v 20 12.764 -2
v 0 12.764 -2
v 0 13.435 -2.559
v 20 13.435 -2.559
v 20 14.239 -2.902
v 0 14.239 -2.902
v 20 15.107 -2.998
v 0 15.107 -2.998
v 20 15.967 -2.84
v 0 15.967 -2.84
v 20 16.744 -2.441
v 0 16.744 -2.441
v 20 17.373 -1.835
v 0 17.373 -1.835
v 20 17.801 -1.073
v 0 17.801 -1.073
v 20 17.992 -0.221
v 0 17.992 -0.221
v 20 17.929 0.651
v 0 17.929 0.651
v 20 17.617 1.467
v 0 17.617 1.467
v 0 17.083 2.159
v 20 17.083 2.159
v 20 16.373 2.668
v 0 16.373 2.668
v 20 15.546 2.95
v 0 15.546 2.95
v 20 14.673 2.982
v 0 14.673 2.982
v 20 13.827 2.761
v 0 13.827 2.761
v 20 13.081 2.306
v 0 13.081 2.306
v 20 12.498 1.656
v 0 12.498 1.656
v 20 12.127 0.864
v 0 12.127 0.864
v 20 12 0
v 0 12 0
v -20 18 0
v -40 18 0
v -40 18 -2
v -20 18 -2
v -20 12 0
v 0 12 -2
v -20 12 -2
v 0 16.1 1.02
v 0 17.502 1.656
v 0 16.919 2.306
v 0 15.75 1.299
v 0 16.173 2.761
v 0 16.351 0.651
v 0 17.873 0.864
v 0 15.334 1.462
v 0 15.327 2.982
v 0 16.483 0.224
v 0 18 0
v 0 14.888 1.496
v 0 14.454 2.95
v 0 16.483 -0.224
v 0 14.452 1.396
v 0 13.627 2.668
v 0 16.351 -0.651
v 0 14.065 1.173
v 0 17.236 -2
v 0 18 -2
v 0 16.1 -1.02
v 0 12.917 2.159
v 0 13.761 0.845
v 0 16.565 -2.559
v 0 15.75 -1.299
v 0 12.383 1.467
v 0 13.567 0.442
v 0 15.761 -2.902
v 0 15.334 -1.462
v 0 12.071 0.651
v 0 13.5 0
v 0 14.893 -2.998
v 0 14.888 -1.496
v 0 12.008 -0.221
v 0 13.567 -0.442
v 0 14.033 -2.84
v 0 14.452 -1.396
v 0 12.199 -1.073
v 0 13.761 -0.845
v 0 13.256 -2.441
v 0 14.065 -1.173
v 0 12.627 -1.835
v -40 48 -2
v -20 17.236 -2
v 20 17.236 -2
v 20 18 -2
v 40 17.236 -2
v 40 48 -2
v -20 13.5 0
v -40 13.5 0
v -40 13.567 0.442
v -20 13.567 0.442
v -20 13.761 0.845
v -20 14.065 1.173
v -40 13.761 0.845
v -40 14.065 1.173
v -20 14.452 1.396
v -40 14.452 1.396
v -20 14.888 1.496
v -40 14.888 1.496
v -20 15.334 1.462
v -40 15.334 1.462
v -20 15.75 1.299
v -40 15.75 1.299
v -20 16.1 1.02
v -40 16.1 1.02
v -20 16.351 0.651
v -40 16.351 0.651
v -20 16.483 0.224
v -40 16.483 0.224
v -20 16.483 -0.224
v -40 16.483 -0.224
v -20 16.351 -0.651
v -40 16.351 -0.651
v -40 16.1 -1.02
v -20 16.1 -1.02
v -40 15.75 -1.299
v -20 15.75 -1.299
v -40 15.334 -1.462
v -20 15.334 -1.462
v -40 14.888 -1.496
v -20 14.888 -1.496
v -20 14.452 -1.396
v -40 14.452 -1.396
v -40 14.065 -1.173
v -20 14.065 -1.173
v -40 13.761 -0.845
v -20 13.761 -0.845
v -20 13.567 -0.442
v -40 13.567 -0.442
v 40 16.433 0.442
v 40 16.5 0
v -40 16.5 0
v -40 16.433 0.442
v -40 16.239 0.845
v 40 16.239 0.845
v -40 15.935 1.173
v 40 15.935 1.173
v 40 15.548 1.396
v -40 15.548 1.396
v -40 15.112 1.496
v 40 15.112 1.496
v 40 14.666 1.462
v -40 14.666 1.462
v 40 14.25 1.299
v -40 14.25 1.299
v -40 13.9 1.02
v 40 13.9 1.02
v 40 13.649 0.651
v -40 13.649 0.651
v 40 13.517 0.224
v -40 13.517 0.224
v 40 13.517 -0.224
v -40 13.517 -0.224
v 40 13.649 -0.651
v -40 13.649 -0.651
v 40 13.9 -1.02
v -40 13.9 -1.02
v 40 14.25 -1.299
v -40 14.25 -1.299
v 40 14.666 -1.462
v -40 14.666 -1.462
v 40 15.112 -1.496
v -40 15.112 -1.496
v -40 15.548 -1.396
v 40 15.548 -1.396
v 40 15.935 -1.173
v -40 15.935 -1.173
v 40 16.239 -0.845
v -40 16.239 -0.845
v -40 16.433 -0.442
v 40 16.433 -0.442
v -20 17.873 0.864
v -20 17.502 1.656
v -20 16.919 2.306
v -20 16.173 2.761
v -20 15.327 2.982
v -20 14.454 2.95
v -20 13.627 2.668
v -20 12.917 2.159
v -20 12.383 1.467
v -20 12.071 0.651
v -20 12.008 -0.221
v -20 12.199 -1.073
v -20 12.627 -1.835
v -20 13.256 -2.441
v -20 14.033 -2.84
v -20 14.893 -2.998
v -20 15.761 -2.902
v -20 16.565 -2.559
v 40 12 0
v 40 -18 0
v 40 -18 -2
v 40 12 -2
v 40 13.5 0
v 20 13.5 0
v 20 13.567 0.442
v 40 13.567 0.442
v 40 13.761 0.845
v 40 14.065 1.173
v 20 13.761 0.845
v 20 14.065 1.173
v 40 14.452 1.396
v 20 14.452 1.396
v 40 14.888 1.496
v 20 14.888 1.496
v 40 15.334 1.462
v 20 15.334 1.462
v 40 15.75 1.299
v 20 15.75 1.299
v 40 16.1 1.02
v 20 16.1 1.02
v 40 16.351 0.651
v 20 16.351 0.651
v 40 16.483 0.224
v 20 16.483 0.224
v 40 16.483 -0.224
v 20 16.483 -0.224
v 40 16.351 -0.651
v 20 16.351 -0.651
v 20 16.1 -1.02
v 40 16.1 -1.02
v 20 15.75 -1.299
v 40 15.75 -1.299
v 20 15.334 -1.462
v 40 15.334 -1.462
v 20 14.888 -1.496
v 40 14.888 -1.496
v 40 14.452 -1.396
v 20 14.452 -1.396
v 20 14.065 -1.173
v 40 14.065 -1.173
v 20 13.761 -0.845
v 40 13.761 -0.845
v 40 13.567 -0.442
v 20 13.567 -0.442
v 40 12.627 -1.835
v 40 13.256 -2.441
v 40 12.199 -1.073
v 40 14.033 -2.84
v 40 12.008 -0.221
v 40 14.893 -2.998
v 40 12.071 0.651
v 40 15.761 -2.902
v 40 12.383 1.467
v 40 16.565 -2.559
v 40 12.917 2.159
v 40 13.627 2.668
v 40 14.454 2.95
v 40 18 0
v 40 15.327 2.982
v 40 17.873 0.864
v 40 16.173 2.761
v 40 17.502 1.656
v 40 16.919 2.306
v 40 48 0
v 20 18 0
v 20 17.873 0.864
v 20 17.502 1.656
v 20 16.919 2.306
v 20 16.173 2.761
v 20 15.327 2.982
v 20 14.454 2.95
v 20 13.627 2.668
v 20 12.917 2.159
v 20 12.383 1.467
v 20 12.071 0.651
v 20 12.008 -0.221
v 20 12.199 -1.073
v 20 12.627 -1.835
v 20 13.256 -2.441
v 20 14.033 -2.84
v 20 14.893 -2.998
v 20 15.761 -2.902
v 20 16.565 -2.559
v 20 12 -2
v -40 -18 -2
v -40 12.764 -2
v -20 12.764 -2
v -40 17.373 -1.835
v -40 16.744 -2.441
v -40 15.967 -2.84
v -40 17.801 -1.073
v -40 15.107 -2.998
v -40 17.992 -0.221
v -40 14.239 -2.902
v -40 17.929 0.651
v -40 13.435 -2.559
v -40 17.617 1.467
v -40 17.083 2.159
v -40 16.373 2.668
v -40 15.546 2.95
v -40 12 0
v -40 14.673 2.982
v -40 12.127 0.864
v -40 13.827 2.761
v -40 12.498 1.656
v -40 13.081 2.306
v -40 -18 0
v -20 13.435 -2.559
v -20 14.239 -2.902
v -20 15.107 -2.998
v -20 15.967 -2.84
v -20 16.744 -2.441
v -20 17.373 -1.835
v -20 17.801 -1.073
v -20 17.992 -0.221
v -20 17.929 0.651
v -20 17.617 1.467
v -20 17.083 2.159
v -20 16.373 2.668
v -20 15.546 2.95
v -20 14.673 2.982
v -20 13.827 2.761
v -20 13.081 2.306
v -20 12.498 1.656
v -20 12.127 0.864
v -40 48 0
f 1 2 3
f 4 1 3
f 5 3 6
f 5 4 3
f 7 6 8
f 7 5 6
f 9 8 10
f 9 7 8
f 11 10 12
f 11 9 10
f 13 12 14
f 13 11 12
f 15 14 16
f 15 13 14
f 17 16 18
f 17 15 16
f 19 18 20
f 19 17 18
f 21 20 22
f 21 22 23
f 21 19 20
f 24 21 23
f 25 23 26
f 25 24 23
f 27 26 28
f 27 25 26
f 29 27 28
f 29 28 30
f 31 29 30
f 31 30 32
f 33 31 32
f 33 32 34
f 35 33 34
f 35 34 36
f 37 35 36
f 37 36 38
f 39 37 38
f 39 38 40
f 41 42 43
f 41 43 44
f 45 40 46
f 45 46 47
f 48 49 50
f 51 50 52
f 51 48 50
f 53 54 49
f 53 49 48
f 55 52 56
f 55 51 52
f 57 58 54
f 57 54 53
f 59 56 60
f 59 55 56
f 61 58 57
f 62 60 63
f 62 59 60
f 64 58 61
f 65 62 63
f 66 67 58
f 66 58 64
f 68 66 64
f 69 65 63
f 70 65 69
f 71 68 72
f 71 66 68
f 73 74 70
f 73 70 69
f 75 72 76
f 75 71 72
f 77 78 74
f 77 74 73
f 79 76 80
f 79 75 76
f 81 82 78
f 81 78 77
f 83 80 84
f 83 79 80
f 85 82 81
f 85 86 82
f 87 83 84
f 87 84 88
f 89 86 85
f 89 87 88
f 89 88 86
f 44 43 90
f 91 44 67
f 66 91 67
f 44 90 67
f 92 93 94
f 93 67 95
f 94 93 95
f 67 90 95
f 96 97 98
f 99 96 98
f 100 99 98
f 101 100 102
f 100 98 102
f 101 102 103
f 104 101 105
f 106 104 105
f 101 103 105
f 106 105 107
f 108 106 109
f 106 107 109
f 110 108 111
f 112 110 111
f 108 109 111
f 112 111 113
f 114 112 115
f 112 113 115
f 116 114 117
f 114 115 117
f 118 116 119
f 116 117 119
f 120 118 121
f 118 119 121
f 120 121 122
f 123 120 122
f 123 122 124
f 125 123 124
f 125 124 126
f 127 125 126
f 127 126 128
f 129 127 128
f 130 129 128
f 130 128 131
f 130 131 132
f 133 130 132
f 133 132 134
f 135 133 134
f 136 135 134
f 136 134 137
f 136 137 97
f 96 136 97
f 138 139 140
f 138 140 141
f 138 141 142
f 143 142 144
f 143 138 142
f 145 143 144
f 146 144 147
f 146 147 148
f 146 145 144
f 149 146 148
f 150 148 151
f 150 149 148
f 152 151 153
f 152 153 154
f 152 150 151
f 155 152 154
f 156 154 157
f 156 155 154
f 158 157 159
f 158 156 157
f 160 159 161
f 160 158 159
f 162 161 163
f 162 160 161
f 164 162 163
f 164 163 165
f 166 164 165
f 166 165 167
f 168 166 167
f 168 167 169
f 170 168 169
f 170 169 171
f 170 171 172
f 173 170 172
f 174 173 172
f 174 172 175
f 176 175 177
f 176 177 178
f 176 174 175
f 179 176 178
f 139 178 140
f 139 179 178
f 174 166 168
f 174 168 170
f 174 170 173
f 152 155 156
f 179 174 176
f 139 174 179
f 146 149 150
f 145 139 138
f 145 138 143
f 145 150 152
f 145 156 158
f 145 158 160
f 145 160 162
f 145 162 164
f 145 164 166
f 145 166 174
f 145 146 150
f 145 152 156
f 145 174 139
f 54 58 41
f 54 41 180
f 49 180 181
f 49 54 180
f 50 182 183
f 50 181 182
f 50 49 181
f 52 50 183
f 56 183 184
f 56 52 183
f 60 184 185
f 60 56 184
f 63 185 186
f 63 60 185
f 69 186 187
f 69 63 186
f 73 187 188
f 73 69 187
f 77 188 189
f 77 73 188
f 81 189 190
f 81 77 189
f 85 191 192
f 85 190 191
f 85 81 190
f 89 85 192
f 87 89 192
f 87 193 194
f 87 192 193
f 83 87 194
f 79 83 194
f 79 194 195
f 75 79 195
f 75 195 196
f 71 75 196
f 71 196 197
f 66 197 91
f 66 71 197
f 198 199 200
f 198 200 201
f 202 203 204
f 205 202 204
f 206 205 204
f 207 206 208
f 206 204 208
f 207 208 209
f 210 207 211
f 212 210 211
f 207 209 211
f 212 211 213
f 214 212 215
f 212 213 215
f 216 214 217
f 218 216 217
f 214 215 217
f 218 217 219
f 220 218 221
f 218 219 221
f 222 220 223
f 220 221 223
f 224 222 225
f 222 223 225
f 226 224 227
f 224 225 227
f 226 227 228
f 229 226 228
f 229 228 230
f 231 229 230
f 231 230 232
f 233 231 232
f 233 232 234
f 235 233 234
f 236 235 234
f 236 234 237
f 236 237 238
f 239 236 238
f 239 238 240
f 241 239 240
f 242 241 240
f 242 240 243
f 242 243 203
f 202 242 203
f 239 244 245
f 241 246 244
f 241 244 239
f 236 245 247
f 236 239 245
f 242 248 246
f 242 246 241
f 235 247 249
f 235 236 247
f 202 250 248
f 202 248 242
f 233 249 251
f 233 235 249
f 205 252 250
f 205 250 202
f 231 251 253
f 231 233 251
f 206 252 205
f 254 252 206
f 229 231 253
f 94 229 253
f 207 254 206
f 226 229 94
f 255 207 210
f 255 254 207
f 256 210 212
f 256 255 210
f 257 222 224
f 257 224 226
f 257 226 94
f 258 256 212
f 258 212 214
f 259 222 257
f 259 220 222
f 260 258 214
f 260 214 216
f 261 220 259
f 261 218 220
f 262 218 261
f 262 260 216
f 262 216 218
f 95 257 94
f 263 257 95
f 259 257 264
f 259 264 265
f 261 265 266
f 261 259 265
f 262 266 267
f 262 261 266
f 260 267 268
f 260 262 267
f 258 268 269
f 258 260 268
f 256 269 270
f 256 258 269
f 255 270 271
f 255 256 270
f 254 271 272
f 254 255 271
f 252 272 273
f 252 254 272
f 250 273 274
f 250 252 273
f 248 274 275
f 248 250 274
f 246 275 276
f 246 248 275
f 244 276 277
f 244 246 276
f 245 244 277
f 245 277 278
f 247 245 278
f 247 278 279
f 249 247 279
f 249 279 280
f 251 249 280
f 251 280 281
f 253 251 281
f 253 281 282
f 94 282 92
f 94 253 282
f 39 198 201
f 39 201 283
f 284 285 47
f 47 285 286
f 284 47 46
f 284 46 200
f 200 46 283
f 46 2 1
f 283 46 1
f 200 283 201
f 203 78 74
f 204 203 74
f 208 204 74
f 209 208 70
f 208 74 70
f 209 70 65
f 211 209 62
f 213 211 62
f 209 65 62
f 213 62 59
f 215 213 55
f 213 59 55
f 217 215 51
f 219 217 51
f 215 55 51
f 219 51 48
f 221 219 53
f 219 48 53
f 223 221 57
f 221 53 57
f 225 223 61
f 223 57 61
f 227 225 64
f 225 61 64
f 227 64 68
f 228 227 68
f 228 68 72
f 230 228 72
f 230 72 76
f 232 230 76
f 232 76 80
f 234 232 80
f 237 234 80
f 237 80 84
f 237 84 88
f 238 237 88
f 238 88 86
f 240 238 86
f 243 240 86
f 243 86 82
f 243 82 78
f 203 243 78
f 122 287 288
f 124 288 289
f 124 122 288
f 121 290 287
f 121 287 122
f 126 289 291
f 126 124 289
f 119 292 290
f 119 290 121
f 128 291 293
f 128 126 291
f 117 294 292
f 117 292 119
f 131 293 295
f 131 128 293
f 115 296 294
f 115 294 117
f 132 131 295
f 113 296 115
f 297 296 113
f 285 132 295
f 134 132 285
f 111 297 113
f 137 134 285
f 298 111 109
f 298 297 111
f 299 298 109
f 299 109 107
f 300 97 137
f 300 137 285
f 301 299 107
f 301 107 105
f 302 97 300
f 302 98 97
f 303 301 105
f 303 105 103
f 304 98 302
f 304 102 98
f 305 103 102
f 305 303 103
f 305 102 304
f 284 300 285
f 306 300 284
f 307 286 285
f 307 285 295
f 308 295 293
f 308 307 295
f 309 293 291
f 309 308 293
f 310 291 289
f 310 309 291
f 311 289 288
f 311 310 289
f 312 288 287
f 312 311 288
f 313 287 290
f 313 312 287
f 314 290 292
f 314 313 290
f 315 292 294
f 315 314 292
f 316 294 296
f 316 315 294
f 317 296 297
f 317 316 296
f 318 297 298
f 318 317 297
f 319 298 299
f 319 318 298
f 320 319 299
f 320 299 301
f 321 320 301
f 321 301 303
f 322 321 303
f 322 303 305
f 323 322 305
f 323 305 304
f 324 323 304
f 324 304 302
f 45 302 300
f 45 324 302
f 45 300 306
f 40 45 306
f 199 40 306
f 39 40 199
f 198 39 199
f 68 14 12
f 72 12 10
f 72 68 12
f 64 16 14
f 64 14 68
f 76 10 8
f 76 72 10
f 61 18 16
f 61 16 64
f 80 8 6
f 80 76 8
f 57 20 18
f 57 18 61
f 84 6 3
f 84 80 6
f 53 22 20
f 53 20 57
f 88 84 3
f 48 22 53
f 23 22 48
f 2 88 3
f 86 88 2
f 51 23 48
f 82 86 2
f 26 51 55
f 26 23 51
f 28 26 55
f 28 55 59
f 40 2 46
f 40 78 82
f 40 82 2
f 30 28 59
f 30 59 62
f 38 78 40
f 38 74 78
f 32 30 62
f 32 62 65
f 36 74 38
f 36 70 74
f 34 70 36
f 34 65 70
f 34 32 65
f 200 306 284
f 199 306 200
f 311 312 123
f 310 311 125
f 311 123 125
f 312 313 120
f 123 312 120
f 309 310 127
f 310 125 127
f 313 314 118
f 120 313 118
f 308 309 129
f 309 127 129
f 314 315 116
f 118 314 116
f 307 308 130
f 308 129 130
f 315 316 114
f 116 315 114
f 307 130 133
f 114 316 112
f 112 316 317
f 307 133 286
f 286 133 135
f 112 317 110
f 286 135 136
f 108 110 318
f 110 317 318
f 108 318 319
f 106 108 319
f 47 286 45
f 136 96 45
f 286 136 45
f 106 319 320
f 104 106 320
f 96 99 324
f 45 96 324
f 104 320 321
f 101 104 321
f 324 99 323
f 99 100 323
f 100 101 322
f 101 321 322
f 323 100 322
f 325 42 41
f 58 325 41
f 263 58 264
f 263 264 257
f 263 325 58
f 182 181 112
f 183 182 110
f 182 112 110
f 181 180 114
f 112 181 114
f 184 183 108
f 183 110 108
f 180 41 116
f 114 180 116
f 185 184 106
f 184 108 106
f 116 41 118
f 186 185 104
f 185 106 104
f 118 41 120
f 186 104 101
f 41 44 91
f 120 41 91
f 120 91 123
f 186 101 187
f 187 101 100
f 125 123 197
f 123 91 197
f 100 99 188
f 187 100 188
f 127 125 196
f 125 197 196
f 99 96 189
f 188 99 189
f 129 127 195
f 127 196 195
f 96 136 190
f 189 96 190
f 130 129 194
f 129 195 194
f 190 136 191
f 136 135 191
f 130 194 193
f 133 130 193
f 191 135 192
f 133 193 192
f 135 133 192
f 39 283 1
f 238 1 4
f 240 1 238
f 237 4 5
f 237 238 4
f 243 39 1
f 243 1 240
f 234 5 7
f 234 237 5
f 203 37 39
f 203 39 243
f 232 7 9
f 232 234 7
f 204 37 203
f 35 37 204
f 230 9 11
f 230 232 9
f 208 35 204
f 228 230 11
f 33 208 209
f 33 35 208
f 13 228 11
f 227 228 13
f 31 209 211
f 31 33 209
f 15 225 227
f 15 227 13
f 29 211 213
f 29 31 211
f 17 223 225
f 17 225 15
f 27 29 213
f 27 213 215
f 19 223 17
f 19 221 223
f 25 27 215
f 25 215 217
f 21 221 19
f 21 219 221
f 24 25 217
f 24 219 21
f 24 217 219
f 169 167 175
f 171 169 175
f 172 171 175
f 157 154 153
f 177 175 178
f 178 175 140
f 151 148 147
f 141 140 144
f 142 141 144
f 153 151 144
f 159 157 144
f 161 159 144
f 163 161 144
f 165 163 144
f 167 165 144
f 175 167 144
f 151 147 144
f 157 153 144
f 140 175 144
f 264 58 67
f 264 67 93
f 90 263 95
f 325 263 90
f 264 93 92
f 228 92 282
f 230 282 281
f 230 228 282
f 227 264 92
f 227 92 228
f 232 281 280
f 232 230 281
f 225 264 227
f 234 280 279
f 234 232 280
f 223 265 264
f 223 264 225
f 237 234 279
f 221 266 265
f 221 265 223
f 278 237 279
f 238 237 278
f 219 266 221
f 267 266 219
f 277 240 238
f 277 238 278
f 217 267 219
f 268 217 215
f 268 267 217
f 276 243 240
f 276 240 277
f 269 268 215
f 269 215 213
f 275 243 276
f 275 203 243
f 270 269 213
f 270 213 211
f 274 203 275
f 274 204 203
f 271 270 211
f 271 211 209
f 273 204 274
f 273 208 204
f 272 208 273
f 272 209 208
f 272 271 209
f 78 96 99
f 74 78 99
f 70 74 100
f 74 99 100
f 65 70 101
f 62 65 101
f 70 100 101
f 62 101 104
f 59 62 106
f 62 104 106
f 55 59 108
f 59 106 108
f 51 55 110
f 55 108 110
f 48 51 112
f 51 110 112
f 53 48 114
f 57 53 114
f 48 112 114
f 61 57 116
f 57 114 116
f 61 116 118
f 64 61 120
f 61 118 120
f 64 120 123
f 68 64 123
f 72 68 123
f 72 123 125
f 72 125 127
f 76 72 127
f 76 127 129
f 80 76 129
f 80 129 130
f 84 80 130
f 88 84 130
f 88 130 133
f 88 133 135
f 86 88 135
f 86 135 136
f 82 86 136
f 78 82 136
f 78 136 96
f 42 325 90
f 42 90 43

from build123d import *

# Parameters (mm, degrees)
F1_DEPTH = 2
F2_DEPTH = 2
F0_W     = 20
F0_H     = 3
F7_D     = 3
F7_2_D   = 3
F6_R     = 1.5
F8_DEPTH = 80


with BuildPart() as f1:
    # F0 (on Top) → F1 (new body)
    with BuildSketch(Plane.XY):
        Polygon((20, 15.0000010577), (40, 15.0000010577), (40, 48.0000031732), (-40, 48.0000031732), (-40, 18.0000010577), (-20, 18.0000010577), (-20, 15.0000010577), (0, 15.0000010577), (0, 18.0000010577), (20, 18.0000010577), align=None)
    extrude(amount=-F1_DEPTH)

    # F0 (on Top) → F4 (revolve)
    with BuildSketch(Plane.XY):
        with Locations((-10, 13.5000010577)):
            Rectangle(F0_W, F0_H)
        with Locations((30, 13.5000010577)):
            Rectangle(F0_W, F0_H)
    revolve(axis=Axis((0, 15.0000010577, 0), (1, 0, 0)))

    # F5: union 

    # F7 (through all)
    with Locations(Plane.YZ.offset(40)):
        with Locations((15.0000010577, 0)):
            Hole(F7_D / 2)


with BuildPart() as f2:
    # F0 (on Top) → F2 (new body)
    with BuildSketch(Plane.XY):
        Polygon((-40, -17.9999989423), (40, -18.0000010577), (40, 12.0000010577), (20, 12.0000010577), (20, 15.0000010577), (0, 15.0000010577), (0, 12.0000010577), (-20, 12.0000010577), (-20, 15.0000010577), (-40, 15.0000010577), align=None)
    extrude(amount=-F2_DEPTH)

    # F0 (on Top) → F3 (revolve)
    with BuildSketch(Plane.XY):
        with Locations((-30, 16.5000010577)):
            Rectangle(F0_W, F0_H)
        with Locations((10, 16.5000010577)):
            Rectangle(F0_W, F0_H)
    revolve(axis=Axis((0, 15.0000010577, 0), (1, 0, 0)))

    # F7#2 (through all)
    with Locations(Plane.YZ.offset(40)):
        with Locations((15.0000010577, 0)):
            Hole(F7_2_D / 2)


with BuildPart() as f8:
    # F6 (on face) → F8 (new body)
    with BuildSketch(Plane.YZ.offset(40)):
        with Locations((15.0000010577, 0)):
            Circle(F6_R)
    extrude(amount=-F8_DEPTH)


solid = Compound([f1.part, f2.part, f8.part])
